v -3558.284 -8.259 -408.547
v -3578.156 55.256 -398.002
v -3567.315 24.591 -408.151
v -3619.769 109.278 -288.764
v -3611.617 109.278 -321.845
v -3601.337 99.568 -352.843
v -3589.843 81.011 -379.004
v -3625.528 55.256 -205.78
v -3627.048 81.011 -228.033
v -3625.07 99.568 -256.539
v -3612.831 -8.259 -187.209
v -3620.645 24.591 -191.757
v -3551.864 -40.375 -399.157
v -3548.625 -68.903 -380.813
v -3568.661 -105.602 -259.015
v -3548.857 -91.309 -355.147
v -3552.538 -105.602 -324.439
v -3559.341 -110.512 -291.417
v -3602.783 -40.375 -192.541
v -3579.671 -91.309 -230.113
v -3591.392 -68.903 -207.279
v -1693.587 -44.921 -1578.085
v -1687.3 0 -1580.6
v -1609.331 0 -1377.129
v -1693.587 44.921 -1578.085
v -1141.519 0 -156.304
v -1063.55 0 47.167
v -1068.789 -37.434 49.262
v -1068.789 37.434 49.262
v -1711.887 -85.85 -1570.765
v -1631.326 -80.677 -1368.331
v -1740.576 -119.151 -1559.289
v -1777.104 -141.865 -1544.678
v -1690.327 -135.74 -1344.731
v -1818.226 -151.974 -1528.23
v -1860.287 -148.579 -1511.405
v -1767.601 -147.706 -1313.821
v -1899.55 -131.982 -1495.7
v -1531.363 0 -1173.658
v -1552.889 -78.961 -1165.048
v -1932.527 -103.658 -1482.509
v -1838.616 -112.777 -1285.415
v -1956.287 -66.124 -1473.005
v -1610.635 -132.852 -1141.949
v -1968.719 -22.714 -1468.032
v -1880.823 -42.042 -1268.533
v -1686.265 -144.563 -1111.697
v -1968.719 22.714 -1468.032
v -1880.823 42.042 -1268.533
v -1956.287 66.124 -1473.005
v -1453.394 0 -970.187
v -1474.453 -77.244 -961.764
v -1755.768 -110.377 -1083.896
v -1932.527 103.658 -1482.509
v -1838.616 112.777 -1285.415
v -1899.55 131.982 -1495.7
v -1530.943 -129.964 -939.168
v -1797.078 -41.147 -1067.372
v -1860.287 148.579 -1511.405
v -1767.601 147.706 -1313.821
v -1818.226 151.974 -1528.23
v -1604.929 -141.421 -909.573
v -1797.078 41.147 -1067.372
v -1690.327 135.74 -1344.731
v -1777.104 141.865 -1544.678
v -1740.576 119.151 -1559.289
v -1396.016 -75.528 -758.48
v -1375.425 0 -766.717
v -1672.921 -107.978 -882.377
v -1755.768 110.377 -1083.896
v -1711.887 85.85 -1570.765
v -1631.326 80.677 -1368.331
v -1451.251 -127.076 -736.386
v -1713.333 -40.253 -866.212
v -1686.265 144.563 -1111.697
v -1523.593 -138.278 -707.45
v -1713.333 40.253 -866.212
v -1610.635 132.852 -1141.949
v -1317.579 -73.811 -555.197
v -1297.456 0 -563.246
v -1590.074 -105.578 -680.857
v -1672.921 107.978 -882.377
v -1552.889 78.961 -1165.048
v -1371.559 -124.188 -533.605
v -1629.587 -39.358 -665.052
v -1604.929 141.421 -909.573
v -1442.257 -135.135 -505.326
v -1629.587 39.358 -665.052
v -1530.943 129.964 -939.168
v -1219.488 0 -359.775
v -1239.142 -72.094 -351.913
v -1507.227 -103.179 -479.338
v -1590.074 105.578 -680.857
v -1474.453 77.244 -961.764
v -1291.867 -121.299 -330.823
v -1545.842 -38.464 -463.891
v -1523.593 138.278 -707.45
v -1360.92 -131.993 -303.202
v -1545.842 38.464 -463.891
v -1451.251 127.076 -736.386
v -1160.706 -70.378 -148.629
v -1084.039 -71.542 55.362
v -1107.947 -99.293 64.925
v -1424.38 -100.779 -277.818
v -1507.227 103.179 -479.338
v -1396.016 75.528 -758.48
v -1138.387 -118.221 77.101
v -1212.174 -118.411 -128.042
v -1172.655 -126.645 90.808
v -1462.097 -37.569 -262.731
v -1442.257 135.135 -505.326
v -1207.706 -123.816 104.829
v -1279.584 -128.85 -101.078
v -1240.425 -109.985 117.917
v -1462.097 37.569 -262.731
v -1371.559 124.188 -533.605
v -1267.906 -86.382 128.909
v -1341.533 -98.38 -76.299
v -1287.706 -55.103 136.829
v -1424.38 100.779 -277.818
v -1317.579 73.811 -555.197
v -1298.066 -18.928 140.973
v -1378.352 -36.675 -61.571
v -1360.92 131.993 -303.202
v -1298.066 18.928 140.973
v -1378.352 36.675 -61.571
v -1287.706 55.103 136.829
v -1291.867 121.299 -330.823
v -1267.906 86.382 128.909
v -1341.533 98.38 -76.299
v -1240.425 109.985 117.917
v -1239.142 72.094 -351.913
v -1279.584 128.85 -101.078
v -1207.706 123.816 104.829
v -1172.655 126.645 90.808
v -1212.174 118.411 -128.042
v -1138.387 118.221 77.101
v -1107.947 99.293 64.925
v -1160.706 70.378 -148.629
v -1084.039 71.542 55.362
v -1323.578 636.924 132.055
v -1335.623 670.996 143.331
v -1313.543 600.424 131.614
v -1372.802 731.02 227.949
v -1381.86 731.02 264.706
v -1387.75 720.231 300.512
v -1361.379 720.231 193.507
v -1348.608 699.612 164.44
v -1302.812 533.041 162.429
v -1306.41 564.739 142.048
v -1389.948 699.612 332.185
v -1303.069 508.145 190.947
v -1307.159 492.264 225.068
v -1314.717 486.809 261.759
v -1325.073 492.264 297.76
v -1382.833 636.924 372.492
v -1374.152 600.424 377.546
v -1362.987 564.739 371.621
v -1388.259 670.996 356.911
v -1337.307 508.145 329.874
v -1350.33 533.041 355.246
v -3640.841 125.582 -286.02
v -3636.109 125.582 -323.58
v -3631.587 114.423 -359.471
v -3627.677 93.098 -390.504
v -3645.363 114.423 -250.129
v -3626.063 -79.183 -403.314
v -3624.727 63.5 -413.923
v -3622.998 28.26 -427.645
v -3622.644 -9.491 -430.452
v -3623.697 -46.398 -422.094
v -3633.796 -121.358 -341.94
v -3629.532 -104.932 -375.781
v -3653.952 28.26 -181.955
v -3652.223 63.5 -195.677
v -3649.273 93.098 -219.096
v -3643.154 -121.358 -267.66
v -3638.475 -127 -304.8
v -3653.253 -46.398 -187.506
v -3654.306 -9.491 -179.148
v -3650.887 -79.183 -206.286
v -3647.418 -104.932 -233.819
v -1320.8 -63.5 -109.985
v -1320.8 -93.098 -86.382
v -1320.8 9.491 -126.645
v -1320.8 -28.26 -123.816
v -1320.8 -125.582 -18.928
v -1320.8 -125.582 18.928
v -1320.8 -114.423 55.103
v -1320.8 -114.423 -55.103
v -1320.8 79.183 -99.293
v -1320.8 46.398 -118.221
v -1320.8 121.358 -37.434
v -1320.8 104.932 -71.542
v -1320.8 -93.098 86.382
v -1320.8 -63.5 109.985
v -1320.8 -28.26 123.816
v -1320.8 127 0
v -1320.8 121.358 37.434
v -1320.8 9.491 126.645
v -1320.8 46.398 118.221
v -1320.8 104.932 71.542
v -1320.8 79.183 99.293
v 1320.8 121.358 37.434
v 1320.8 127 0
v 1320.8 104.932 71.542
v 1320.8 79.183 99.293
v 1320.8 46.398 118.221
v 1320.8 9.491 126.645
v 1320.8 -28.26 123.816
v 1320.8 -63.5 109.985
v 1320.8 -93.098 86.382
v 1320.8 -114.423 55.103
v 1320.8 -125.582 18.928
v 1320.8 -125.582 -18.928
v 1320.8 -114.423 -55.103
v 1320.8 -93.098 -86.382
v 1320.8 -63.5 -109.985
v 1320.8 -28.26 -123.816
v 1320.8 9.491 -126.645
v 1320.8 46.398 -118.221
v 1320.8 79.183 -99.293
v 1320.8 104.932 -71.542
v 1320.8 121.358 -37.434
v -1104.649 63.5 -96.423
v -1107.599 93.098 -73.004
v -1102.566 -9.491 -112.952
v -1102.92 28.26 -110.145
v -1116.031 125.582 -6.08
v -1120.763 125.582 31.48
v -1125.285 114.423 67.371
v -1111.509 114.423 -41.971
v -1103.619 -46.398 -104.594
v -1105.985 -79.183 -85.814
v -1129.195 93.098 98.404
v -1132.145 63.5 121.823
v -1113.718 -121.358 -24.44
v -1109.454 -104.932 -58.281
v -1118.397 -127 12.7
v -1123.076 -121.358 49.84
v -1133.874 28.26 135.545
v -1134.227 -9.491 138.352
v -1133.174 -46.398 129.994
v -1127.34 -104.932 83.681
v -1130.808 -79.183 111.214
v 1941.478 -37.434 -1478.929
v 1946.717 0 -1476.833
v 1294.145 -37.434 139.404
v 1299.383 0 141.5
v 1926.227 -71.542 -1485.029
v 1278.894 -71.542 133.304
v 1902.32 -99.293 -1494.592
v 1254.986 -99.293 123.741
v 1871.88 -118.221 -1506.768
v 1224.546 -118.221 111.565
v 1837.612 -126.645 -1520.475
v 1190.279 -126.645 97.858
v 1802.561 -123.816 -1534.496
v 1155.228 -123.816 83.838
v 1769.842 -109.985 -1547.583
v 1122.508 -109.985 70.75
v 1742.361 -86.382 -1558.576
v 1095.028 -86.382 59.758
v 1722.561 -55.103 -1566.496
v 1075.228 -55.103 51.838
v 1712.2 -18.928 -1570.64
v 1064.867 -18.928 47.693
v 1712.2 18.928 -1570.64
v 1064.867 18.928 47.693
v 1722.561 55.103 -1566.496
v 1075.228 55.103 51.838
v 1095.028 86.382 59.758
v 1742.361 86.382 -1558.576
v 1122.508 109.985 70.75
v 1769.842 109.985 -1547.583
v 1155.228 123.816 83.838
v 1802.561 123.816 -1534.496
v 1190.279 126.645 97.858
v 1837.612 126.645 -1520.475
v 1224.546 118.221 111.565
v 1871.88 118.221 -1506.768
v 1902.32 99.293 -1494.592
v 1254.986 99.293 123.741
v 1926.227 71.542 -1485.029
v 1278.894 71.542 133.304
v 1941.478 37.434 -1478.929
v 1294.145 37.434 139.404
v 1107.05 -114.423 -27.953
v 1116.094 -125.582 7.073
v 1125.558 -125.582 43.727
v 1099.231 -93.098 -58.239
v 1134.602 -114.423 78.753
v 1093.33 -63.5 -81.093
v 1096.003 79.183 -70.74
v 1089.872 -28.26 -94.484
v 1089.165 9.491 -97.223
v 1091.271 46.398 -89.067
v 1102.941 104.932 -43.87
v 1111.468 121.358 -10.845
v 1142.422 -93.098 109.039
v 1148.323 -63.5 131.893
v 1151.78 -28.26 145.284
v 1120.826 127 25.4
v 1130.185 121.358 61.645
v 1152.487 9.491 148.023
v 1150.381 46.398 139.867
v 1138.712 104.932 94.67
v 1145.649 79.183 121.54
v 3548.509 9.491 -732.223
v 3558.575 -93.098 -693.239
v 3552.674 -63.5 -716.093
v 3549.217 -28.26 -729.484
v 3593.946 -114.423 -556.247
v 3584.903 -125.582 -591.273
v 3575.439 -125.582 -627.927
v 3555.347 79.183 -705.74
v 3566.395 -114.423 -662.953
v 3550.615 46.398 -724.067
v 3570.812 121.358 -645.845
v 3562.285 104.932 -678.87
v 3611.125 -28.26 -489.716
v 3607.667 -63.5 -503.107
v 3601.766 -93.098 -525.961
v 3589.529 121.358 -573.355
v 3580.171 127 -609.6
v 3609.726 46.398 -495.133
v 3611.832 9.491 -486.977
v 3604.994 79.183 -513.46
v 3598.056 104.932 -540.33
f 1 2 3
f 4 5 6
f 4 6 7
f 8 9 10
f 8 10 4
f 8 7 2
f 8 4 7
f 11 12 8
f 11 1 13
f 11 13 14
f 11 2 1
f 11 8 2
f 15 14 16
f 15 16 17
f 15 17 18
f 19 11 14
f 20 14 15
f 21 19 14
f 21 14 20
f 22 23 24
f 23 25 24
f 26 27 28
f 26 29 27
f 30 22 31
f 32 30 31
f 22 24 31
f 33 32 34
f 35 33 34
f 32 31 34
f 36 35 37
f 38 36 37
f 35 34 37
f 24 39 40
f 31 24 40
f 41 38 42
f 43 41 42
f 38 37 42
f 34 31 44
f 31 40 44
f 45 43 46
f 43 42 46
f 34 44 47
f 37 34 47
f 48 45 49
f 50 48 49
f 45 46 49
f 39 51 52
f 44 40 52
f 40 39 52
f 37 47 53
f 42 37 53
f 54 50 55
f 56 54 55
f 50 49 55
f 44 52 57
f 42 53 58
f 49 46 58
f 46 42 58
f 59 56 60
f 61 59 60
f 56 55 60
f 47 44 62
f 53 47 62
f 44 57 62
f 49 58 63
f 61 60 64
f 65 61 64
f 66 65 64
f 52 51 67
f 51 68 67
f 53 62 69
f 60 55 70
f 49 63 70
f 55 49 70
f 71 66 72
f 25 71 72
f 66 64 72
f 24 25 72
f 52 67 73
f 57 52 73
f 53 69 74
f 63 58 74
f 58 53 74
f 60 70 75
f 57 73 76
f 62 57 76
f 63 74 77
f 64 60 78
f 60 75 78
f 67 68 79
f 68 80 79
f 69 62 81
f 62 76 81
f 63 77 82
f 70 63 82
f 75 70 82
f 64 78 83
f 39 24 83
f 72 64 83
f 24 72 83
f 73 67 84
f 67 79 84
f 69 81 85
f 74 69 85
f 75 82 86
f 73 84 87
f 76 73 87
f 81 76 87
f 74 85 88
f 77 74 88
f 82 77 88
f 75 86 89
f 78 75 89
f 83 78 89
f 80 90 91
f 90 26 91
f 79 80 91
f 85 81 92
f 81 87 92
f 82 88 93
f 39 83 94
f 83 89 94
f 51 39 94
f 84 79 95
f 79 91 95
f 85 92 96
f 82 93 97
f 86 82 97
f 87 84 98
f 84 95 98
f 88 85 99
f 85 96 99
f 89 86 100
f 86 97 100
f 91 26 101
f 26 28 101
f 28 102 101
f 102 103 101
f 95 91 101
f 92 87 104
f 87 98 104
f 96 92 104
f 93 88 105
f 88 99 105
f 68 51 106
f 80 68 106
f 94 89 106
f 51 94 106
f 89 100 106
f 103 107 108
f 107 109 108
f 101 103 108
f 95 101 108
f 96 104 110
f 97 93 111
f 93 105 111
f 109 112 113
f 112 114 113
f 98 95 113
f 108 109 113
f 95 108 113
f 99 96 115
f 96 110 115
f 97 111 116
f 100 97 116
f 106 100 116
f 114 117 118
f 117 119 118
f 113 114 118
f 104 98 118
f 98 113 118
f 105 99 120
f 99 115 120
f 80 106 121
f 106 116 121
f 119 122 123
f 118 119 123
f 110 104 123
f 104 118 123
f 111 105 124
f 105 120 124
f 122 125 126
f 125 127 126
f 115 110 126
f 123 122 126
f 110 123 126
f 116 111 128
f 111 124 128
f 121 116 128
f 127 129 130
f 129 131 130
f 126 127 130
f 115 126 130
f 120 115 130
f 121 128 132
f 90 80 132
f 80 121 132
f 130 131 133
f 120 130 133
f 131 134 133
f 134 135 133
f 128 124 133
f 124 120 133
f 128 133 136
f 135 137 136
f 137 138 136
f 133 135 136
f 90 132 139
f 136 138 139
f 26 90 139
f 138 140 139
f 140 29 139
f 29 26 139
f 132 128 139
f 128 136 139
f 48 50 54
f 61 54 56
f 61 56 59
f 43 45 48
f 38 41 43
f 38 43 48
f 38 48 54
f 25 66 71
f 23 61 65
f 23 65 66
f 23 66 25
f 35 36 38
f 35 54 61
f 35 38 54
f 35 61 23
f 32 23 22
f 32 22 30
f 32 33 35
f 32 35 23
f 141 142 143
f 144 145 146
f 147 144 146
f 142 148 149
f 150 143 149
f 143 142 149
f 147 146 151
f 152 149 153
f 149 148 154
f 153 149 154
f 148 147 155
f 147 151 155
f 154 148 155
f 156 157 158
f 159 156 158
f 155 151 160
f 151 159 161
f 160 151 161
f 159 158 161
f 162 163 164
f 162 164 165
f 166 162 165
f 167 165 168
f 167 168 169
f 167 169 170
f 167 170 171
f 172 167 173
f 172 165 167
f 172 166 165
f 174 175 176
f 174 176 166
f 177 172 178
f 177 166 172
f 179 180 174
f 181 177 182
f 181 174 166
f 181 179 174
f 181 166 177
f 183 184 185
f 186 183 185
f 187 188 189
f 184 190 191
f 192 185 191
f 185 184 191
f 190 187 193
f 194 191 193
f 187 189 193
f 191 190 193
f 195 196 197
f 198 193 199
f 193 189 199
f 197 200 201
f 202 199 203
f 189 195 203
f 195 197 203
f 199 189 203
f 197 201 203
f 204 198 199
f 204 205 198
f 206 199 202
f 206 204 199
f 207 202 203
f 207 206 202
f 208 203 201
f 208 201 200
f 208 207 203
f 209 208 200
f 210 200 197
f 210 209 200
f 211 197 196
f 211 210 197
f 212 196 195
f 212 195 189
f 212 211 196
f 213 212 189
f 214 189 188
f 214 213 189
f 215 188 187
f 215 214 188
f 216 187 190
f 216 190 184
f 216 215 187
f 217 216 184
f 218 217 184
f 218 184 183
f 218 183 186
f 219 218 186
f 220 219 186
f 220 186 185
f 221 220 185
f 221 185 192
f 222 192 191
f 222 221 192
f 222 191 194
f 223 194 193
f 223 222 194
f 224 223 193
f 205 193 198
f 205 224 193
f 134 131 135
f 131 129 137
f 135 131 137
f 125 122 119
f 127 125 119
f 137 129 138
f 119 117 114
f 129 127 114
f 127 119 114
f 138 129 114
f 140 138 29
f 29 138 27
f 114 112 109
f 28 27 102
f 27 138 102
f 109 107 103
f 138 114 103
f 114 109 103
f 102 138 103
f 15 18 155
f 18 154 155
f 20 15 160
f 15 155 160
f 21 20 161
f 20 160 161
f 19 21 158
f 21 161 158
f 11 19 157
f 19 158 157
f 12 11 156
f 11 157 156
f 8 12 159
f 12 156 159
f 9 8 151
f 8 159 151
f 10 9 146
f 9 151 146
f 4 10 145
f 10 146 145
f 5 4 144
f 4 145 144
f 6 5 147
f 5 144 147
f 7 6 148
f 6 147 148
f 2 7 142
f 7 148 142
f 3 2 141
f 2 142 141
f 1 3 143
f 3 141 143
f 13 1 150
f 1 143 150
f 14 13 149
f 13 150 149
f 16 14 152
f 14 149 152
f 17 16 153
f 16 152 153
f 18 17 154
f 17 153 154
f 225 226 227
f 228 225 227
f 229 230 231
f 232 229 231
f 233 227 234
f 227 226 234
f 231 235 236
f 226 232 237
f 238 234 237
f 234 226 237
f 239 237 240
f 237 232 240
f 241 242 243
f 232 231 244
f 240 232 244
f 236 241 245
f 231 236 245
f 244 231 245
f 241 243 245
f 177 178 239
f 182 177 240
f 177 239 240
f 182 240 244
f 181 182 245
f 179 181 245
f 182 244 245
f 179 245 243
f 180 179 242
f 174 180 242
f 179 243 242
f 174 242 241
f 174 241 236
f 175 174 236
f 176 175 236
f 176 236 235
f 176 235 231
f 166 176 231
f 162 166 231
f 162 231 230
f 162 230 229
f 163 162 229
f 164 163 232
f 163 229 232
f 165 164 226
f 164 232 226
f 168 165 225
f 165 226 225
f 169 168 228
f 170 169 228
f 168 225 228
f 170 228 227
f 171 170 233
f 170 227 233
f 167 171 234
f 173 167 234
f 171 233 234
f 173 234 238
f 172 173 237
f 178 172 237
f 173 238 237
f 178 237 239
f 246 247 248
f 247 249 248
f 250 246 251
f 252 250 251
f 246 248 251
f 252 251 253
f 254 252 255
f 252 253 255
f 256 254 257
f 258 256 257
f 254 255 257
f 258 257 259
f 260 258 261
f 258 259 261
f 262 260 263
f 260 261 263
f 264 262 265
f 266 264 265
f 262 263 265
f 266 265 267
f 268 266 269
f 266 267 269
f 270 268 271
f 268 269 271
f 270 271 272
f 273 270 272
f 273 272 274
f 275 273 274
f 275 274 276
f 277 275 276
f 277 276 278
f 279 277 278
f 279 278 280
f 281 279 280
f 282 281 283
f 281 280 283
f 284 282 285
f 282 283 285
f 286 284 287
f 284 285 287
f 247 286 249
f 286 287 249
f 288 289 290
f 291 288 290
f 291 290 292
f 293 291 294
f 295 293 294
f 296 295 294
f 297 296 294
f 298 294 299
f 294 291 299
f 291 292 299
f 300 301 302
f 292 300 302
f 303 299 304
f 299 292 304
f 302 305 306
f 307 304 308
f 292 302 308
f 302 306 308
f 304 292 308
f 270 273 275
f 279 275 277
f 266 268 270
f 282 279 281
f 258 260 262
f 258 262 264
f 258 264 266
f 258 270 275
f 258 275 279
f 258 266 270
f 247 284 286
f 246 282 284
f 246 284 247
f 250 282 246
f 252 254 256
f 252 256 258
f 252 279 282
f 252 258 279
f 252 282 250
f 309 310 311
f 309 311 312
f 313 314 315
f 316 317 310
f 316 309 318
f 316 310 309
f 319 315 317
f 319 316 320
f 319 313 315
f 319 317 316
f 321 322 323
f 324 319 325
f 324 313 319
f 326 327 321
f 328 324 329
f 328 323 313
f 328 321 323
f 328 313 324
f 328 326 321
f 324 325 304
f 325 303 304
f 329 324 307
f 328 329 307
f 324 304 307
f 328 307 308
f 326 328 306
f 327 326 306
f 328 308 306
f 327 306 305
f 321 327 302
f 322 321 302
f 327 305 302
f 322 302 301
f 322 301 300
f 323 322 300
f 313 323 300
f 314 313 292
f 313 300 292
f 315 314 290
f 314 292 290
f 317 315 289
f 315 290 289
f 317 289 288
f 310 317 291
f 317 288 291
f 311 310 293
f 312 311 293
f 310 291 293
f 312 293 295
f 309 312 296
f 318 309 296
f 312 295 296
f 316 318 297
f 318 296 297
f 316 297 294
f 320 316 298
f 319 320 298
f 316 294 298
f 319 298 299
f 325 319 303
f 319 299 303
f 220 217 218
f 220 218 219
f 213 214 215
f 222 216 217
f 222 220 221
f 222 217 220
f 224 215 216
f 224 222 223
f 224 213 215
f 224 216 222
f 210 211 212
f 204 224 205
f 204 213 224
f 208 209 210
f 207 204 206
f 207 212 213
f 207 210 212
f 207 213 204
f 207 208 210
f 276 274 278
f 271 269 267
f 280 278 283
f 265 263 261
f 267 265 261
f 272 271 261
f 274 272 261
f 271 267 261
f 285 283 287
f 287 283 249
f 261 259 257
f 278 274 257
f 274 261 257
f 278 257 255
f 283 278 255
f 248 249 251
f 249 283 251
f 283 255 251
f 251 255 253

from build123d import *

# Parameters (mm, degrees)
F5_R  = 127
F6_R  = 127
F10_R = 152.4
F11_R = 127
F16_R = 127
F15_R = 127
F20_R = 127
F21_R = 127
F26_R = 127
F25_R = 127
F34_R = 114.3
F33_R = 127


with BuildPart() as f7:
    # F5 (on line) → F7 section 0
    with BuildSketch(Plane(origin=(-3619.4249988375, 0, -456.0046874273), x_dir=(0, -1, 0), z_dir=(-0.9921567416, 0, -0.125))):
        with Locations((0, 152.4)):
            Circle(F5_R)
    # F6 (on line) → F7 section 1
    with BuildSketch(Plane(origin=(-1099.3468750484, 0, -138.5046874273), x_dir=(0, -1, 0), z_dir=(-0.9921567416, 0, -0.125))):
        with Locations((0, 152.4)):
            Circle(F6_R)
    loft()


with BuildPart() as f12:
    # F10 (on line) → F12 section 0
    with BuildSketch(Plane(origin=(-777.7655172414, 0, -1944.4137931034), x_dir=(0.9284766909, 0, -0.3713906764), z_dir=(-0.3713906764, 0, -0.9284766909))):
        with Locations((-1131.9987815273, 0)):
            Circle(F10_R)
    # F11 (on line) → F12 section 1
    with BuildSketch(Plane(origin=(-130.4322245238, 0, -326.0805613095), x_dir=(0.9284766909, 0, -0.3713906764), z_dir=(-0.3713906764, 0, -0.9284766909))):
        with Locations((-1131.9987815273, 0)):
            Circle(F11_R)
    loft()


with BuildPart() as f17:
    # F16 (on line) → F17 section 0
    with BuildSketch(Plane.YZ.offset(-1320.8)):
        Circle(F16_R)
    # F15 (on line) → F17 section 1
    with BuildSketch(Plane.YZ.offset(1320.8)):
        Circle(F15_R)
    loft()


with BuildPart() as f22:
    # F20 (on line) → F22 section 0
    with BuildSketch(Plane(origin=(3503.970647848, 0, -904.721330981), x_dir=(0, 1, 0), z_dir=(0.9682458366, 0, -0.25))):
        with Locations((0, 304.8)):
            Circle(F20_R)
    # F21 (on line) → F22 section 1
    with BuildSketch(Plane(origin=(1044.6262230063, 0, -269.721330981), x_dir=(0, 1, 0), z_dir=(0.9682458366, 0, -0.25))):
        with Locations((0, 304.8)):
            Circle(F21_R)
    loft()


with BuildPart() as f27:
    # F26 (on line) → F27 section 0
    with BuildSketch(Plane(origin=(777.7655172414, 0, -1944.4137931034), x_dir=(0.9284766909, 0, 0.3713906764), z_dir=(0.3713906764, 0, -0.9284766909))):
        with Locations((1131.9987815273, 0)):
            Circle(F26_R)
    # F25 (on line) → F27 section 1
    with BuildSketch(Plane(origin=(130.4322245238, 0, -326.0805613095), x_dir=(0.9284766909, 0, 0.3713906764), z_dir=(0.3713906764, 0, -0.9284766909))):
        with Locations((1131.9987815273, 0)):
            Circle(F25_R)
    loft()


with BuildPart() as f35:
    # F34 (on line) → F35 section 0
    with BuildSketch(Plane(origin=(-3226.5940426286, -877.5166929841, -795.1772426126), x_dir=(0.24789468, -0.966858807, 0.0610923486), z_dir=(-0.9387708644, -0.2553116672, -0.2313551744))):
        with Locations((-907.5954903344, 568.7470925075)):
            Circle(F34_R)
    # F33 (on line) → F35 section 1
    with BuildSketch(Plane(origin=(-985.1190437912, -267.9166929841, -242.7774410223), x_dir=(0.24789468, -0.966858807, 0.0610923486), z_dir=(-0.9387708644, -0.2553116672, -0.2313551744))):
        with Locations((-907.5954903344, 568.7470925075)):
            Circle(F33_R)
    loft()


solid = Compound([f7.part, f12.part, f17.part, f22.part, f27.part, f35.part])
